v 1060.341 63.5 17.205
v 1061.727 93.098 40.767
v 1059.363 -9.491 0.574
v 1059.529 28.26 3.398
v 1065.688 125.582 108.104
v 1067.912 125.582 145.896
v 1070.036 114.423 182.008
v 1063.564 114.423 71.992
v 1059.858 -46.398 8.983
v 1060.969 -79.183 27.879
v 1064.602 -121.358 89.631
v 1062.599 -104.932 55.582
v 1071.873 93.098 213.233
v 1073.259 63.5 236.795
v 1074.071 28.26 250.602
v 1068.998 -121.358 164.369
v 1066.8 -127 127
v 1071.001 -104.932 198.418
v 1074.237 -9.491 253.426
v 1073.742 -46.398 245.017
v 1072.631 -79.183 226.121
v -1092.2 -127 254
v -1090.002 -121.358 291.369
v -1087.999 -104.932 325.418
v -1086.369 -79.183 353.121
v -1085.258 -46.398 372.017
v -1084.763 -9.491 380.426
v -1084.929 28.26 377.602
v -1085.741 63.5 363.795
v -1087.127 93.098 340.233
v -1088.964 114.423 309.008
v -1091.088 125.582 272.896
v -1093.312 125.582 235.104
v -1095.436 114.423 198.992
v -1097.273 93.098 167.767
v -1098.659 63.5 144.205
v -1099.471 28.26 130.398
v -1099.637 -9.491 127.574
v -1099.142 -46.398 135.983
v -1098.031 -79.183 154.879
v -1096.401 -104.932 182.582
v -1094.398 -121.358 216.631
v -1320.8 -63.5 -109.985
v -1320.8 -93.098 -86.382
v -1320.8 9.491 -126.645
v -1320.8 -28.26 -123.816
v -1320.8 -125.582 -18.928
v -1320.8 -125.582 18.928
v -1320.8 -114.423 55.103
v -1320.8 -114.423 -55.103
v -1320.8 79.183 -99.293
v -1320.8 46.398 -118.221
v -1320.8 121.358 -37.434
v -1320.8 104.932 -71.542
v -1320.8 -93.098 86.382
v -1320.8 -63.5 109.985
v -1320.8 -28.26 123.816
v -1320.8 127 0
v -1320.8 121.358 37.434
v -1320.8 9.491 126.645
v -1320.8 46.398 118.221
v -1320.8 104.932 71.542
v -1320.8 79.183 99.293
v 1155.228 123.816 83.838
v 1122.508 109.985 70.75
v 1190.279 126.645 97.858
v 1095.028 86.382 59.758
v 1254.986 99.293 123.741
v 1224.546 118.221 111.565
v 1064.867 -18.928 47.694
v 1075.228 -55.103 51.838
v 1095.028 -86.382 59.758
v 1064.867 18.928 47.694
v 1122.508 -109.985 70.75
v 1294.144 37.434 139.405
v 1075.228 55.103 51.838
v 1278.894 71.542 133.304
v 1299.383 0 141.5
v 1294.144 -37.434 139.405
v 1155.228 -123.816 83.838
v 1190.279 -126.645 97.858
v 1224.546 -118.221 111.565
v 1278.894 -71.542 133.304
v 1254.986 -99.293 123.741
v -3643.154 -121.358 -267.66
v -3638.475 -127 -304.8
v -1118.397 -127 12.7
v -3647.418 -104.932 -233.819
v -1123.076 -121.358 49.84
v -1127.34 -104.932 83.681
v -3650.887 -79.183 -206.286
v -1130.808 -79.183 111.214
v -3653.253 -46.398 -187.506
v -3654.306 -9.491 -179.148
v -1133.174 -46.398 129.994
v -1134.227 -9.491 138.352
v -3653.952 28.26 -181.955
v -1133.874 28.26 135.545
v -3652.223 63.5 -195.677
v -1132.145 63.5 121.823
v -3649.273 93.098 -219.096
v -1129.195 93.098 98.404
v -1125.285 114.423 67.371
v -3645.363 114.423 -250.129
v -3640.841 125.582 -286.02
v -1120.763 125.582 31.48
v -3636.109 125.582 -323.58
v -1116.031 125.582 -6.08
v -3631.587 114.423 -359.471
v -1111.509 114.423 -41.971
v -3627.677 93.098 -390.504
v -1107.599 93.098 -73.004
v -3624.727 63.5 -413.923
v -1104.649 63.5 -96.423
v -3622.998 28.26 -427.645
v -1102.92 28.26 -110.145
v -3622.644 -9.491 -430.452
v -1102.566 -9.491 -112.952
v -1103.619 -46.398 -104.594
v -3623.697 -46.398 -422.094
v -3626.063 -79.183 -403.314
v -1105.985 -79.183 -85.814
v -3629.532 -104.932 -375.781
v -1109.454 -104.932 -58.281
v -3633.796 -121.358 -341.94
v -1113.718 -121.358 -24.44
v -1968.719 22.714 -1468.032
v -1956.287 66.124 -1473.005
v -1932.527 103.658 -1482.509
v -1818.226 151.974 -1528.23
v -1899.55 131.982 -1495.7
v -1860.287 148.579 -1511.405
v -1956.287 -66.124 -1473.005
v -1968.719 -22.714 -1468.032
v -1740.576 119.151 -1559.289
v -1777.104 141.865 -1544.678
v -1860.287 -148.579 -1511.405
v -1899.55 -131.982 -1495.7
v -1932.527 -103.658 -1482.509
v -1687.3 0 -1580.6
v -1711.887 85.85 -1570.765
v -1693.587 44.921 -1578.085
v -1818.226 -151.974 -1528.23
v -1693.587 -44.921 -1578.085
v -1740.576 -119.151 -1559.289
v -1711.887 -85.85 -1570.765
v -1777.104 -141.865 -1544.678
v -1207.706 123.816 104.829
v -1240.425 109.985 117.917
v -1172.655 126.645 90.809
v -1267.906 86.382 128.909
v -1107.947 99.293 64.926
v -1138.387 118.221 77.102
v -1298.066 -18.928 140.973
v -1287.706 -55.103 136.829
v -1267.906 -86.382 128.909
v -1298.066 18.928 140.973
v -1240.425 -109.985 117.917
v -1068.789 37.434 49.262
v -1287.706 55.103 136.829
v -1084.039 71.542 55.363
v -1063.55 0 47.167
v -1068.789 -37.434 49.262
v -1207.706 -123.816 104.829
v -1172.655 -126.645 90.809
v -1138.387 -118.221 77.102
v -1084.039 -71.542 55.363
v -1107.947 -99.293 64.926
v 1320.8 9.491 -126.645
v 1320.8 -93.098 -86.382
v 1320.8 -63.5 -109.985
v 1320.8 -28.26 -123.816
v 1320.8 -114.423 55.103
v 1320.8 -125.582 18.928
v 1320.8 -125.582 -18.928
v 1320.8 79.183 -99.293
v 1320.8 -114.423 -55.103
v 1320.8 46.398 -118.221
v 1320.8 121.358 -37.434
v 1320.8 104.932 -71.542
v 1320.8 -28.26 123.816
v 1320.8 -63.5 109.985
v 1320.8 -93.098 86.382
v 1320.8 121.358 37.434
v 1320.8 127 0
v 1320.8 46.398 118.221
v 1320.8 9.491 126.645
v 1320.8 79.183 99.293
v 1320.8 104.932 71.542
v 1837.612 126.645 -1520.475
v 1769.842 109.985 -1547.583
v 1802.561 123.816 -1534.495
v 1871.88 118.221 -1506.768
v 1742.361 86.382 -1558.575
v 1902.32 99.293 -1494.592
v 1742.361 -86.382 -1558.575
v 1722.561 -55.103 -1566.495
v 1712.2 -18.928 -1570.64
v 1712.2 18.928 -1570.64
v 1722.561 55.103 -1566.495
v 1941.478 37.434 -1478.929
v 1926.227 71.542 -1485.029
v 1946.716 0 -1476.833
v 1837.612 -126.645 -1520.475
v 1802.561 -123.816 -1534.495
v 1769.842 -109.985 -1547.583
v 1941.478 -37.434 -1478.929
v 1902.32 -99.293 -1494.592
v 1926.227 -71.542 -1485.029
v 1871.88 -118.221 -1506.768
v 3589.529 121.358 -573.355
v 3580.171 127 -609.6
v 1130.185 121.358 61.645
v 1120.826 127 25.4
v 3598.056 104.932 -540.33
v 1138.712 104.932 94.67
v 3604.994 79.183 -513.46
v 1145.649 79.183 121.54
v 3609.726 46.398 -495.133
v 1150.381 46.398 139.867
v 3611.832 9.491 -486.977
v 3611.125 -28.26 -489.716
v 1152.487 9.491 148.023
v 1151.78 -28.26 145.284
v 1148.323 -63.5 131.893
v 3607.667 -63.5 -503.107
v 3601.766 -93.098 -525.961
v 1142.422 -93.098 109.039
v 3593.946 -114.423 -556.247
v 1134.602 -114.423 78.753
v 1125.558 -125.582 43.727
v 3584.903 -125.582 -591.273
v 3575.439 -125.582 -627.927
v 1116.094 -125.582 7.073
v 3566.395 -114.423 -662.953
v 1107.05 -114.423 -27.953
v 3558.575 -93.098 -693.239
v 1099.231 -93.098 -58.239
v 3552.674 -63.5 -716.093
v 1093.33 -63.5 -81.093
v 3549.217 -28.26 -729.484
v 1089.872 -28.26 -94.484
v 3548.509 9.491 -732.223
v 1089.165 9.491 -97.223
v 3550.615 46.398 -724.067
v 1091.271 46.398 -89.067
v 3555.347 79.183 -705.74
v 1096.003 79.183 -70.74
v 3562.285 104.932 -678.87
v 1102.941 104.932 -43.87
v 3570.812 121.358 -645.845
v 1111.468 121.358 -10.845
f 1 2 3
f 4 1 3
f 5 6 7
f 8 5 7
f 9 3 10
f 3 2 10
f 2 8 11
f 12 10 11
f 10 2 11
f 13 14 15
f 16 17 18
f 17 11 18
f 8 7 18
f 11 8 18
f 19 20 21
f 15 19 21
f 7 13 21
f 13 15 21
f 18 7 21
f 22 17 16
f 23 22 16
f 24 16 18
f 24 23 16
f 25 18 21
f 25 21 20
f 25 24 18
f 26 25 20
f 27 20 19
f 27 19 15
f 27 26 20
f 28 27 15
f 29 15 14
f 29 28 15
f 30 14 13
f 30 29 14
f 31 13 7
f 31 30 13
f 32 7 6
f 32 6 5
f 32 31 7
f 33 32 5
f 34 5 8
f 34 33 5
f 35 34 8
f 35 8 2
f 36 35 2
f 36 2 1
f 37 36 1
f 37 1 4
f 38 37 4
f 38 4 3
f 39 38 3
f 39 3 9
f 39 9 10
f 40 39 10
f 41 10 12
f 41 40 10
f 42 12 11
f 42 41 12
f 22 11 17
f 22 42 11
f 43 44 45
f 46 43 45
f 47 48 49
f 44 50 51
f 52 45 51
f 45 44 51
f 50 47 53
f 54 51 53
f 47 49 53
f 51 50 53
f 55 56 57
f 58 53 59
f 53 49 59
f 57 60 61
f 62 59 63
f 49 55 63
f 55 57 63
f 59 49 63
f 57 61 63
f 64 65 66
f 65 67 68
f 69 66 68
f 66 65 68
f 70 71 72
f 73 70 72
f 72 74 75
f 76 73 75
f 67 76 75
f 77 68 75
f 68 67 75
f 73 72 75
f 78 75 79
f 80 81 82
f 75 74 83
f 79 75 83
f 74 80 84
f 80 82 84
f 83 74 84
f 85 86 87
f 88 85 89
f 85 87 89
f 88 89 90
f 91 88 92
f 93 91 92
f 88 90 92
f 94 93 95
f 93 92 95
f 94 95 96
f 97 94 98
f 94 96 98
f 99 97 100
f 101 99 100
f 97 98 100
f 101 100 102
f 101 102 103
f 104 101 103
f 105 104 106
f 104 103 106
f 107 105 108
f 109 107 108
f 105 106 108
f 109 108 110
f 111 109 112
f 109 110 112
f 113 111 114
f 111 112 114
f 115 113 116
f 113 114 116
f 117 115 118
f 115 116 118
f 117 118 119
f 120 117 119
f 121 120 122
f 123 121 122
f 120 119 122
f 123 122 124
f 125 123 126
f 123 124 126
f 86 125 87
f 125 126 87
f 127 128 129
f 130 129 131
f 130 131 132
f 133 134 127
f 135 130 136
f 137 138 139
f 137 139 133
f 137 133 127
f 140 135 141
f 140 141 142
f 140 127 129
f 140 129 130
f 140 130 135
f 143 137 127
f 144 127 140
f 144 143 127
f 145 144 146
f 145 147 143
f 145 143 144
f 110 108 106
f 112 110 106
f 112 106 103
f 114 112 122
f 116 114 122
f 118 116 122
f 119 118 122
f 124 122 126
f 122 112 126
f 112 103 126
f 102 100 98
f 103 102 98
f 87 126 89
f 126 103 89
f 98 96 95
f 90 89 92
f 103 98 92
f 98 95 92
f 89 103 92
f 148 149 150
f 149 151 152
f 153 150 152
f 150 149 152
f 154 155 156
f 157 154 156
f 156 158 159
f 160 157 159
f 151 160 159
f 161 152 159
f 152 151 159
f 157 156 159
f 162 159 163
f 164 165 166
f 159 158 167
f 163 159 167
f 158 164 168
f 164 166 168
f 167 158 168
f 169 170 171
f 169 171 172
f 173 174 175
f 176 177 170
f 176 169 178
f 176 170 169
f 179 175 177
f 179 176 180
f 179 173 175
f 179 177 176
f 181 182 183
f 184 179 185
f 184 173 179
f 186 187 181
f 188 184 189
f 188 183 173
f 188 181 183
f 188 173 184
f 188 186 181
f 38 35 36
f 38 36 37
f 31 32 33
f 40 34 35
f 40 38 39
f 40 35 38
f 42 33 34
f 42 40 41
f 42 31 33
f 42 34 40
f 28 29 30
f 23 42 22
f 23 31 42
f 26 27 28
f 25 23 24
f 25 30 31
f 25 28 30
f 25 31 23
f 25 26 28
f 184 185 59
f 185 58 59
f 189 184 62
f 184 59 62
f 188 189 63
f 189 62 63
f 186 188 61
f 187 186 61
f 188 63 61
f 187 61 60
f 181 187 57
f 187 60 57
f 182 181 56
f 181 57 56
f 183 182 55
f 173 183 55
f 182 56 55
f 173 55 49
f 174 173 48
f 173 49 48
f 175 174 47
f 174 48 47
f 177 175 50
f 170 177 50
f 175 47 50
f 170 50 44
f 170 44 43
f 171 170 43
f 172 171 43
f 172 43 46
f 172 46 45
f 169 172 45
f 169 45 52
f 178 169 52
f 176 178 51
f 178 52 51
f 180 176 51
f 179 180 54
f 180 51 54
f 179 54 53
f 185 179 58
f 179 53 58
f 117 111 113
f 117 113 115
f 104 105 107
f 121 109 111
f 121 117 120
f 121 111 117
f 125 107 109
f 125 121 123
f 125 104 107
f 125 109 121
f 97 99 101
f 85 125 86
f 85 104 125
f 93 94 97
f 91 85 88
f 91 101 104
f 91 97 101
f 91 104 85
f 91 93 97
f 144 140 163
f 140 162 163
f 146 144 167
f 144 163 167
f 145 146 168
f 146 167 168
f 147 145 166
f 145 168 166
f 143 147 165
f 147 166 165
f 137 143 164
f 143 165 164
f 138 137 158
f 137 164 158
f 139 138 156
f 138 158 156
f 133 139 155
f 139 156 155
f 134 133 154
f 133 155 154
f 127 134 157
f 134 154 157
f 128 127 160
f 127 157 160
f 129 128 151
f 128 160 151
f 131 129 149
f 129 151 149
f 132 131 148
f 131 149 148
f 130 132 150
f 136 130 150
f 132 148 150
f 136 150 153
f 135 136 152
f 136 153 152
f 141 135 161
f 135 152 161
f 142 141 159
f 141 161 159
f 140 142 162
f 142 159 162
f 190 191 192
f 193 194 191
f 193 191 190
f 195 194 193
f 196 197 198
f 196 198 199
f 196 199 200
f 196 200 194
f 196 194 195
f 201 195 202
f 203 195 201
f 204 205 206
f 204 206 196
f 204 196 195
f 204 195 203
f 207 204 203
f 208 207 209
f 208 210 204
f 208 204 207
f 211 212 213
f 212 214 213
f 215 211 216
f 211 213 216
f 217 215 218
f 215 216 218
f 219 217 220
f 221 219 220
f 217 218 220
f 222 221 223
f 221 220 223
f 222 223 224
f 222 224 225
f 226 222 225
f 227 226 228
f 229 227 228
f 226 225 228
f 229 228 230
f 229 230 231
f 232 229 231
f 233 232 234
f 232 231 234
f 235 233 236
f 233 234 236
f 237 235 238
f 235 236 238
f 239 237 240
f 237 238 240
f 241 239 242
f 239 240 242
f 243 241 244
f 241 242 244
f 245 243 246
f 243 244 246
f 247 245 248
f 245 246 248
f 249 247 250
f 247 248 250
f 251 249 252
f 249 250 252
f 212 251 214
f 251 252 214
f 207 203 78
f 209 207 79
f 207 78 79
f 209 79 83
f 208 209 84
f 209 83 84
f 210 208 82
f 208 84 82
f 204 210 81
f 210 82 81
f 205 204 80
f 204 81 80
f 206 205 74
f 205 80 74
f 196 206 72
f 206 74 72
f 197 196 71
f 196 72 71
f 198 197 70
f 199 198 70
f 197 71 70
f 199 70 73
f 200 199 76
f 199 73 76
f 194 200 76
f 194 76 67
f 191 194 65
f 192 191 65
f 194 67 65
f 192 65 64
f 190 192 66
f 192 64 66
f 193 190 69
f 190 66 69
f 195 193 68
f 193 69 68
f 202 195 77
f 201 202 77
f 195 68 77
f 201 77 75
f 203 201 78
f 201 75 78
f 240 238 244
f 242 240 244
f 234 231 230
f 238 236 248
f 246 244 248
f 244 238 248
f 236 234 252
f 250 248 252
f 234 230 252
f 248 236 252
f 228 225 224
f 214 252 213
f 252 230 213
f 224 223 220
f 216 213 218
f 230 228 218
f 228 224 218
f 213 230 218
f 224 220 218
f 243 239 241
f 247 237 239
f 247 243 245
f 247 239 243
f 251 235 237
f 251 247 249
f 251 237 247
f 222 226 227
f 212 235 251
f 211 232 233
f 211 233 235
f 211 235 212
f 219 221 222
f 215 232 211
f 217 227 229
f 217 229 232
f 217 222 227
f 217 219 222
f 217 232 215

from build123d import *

# Parameters (mm, degrees)
F3_R  = 127
F4_R  = 127
F8_R  = 152.4
F9_R  = 127
F14_R = 127
F13_R = 127
F18_R = 127
F19_R = 127
F24_R = 127
F23_R = 127
F28_R = 127
F29_R = 127


with BuildPart() as f5:
    # F3 (on face) → F5 section 0
    with BuildSketch(Plane(origin=(-3619.424999, 0, -456.004687), x_dir=(0, -1, 0), z_dir=(-0.992157, 0, -0.125))):
        with Locations((0, 152.4)):
            Circle(F3_R)
    # F4 (on face) → F5 section 1
    with BuildSketch(Plane(origin=(-1099.346875, 0, -138.504687), x_dir=(0, -1, 0), z_dir=(-0.992157, 0, -0.125))):
        with Locations((0, 152.4)):
            Circle(F4_R)
    loft()


with BuildPart() as f10:
    # F8 (on face) → F10 section 0
    with BuildSketch(Plane(origin=(-777.765517, 0, -1944.413793), x_dir=(0.928477, 0, -0.371391), z_dir=(-0.371391, 0, -0.928477))):
        with Locations((-1131.998782, 0)):
            Circle(F8_R)
    # F9 (on face) → F10 section 1
    with BuildSketch(Plane(origin=(-130.432225, 0, -326.080561), x_dir=(0.928477, 0, -0.371391), z_dir=(-0.371391, 0, -0.928477))):
        with Locations((-1131.998782, 0)):
            Circle(F9_R)
    loft()


with BuildPart() as f15:
    # F14 (on face) → F15 section 0
    with BuildSketch(Plane.YZ.offset(1320.8)):
        Circle(F14_R)
    # F13 (on face) → F15 section 1
    with BuildSketch(Plane.YZ.offset(-1320.8)):
        Circle(F13_R)
    loft()


with BuildPart() as f20:
    # F18 (on face) → F20 section 0
    with BuildSketch(Plane(origin=(3503.970648, 0, -904.721331), x_dir=(0, 1, 0), z_dir=(0.968246, 0, -0.25))):
        with Locations((0, 304.8)):
            Circle(F18_R)
    # F19 (on face) → F20 section 1
    with BuildSketch(Plane(origin=(1044.626223, 0, -269.721331), x_dir=(0, 1, 0), z_dir=(0.968246, 0, -0.25))):
        with Locations((0, 304.8)):
            Circle(F19_R)
    loft()


with BuildPart() as f25:
    # F24 (on face) → F25 section 0
    with BuildSketch(Plane(origin=(777.765517, 0, -1944.413793), x_dir=(0.928477, 0, 0.371391), z_dir=(0.371391, 0, -0.928477))):
        with Locations((1131.998782, 0)):
            Circle(F24_R)
    # F23 (on face) → F25 section 1
    with BuildSketch(Plane(origin=(130.432225, 0, -326.080561), x_dir=(0.928477, 0, 0.371391), z_dir=(0.371391, 0, -0.928477))):
        with Locations((1131.998782, 0)):
            Circle(F23_R)
    loft()


with BuildPart() as f30:
    # F28 (on face) → F30 section 0
    with BuildSketch(Plane(origin=(1055.676552, 0, -62.098621), x_dir=(0, -1, 0), z_dir=(-0.998274, 0, 0.058722))):
        with Locations((0, 189.425498)):
            Circle(F28_R)
    # F29 (on face) → F30 section 1
    with BuildSketch(Plane(origin=(-1103.323448, 0, 64.901379), x_dir=(0, -1, 0), z_dir=(-0.998274, 0, 0.058722))):
        with Locations((0, 189.425498)):
            Circle(F29_R)
    loft()


solid = Compound([f5.part, f10.part, f15.part, f20.part, f25.part, f30.part])
